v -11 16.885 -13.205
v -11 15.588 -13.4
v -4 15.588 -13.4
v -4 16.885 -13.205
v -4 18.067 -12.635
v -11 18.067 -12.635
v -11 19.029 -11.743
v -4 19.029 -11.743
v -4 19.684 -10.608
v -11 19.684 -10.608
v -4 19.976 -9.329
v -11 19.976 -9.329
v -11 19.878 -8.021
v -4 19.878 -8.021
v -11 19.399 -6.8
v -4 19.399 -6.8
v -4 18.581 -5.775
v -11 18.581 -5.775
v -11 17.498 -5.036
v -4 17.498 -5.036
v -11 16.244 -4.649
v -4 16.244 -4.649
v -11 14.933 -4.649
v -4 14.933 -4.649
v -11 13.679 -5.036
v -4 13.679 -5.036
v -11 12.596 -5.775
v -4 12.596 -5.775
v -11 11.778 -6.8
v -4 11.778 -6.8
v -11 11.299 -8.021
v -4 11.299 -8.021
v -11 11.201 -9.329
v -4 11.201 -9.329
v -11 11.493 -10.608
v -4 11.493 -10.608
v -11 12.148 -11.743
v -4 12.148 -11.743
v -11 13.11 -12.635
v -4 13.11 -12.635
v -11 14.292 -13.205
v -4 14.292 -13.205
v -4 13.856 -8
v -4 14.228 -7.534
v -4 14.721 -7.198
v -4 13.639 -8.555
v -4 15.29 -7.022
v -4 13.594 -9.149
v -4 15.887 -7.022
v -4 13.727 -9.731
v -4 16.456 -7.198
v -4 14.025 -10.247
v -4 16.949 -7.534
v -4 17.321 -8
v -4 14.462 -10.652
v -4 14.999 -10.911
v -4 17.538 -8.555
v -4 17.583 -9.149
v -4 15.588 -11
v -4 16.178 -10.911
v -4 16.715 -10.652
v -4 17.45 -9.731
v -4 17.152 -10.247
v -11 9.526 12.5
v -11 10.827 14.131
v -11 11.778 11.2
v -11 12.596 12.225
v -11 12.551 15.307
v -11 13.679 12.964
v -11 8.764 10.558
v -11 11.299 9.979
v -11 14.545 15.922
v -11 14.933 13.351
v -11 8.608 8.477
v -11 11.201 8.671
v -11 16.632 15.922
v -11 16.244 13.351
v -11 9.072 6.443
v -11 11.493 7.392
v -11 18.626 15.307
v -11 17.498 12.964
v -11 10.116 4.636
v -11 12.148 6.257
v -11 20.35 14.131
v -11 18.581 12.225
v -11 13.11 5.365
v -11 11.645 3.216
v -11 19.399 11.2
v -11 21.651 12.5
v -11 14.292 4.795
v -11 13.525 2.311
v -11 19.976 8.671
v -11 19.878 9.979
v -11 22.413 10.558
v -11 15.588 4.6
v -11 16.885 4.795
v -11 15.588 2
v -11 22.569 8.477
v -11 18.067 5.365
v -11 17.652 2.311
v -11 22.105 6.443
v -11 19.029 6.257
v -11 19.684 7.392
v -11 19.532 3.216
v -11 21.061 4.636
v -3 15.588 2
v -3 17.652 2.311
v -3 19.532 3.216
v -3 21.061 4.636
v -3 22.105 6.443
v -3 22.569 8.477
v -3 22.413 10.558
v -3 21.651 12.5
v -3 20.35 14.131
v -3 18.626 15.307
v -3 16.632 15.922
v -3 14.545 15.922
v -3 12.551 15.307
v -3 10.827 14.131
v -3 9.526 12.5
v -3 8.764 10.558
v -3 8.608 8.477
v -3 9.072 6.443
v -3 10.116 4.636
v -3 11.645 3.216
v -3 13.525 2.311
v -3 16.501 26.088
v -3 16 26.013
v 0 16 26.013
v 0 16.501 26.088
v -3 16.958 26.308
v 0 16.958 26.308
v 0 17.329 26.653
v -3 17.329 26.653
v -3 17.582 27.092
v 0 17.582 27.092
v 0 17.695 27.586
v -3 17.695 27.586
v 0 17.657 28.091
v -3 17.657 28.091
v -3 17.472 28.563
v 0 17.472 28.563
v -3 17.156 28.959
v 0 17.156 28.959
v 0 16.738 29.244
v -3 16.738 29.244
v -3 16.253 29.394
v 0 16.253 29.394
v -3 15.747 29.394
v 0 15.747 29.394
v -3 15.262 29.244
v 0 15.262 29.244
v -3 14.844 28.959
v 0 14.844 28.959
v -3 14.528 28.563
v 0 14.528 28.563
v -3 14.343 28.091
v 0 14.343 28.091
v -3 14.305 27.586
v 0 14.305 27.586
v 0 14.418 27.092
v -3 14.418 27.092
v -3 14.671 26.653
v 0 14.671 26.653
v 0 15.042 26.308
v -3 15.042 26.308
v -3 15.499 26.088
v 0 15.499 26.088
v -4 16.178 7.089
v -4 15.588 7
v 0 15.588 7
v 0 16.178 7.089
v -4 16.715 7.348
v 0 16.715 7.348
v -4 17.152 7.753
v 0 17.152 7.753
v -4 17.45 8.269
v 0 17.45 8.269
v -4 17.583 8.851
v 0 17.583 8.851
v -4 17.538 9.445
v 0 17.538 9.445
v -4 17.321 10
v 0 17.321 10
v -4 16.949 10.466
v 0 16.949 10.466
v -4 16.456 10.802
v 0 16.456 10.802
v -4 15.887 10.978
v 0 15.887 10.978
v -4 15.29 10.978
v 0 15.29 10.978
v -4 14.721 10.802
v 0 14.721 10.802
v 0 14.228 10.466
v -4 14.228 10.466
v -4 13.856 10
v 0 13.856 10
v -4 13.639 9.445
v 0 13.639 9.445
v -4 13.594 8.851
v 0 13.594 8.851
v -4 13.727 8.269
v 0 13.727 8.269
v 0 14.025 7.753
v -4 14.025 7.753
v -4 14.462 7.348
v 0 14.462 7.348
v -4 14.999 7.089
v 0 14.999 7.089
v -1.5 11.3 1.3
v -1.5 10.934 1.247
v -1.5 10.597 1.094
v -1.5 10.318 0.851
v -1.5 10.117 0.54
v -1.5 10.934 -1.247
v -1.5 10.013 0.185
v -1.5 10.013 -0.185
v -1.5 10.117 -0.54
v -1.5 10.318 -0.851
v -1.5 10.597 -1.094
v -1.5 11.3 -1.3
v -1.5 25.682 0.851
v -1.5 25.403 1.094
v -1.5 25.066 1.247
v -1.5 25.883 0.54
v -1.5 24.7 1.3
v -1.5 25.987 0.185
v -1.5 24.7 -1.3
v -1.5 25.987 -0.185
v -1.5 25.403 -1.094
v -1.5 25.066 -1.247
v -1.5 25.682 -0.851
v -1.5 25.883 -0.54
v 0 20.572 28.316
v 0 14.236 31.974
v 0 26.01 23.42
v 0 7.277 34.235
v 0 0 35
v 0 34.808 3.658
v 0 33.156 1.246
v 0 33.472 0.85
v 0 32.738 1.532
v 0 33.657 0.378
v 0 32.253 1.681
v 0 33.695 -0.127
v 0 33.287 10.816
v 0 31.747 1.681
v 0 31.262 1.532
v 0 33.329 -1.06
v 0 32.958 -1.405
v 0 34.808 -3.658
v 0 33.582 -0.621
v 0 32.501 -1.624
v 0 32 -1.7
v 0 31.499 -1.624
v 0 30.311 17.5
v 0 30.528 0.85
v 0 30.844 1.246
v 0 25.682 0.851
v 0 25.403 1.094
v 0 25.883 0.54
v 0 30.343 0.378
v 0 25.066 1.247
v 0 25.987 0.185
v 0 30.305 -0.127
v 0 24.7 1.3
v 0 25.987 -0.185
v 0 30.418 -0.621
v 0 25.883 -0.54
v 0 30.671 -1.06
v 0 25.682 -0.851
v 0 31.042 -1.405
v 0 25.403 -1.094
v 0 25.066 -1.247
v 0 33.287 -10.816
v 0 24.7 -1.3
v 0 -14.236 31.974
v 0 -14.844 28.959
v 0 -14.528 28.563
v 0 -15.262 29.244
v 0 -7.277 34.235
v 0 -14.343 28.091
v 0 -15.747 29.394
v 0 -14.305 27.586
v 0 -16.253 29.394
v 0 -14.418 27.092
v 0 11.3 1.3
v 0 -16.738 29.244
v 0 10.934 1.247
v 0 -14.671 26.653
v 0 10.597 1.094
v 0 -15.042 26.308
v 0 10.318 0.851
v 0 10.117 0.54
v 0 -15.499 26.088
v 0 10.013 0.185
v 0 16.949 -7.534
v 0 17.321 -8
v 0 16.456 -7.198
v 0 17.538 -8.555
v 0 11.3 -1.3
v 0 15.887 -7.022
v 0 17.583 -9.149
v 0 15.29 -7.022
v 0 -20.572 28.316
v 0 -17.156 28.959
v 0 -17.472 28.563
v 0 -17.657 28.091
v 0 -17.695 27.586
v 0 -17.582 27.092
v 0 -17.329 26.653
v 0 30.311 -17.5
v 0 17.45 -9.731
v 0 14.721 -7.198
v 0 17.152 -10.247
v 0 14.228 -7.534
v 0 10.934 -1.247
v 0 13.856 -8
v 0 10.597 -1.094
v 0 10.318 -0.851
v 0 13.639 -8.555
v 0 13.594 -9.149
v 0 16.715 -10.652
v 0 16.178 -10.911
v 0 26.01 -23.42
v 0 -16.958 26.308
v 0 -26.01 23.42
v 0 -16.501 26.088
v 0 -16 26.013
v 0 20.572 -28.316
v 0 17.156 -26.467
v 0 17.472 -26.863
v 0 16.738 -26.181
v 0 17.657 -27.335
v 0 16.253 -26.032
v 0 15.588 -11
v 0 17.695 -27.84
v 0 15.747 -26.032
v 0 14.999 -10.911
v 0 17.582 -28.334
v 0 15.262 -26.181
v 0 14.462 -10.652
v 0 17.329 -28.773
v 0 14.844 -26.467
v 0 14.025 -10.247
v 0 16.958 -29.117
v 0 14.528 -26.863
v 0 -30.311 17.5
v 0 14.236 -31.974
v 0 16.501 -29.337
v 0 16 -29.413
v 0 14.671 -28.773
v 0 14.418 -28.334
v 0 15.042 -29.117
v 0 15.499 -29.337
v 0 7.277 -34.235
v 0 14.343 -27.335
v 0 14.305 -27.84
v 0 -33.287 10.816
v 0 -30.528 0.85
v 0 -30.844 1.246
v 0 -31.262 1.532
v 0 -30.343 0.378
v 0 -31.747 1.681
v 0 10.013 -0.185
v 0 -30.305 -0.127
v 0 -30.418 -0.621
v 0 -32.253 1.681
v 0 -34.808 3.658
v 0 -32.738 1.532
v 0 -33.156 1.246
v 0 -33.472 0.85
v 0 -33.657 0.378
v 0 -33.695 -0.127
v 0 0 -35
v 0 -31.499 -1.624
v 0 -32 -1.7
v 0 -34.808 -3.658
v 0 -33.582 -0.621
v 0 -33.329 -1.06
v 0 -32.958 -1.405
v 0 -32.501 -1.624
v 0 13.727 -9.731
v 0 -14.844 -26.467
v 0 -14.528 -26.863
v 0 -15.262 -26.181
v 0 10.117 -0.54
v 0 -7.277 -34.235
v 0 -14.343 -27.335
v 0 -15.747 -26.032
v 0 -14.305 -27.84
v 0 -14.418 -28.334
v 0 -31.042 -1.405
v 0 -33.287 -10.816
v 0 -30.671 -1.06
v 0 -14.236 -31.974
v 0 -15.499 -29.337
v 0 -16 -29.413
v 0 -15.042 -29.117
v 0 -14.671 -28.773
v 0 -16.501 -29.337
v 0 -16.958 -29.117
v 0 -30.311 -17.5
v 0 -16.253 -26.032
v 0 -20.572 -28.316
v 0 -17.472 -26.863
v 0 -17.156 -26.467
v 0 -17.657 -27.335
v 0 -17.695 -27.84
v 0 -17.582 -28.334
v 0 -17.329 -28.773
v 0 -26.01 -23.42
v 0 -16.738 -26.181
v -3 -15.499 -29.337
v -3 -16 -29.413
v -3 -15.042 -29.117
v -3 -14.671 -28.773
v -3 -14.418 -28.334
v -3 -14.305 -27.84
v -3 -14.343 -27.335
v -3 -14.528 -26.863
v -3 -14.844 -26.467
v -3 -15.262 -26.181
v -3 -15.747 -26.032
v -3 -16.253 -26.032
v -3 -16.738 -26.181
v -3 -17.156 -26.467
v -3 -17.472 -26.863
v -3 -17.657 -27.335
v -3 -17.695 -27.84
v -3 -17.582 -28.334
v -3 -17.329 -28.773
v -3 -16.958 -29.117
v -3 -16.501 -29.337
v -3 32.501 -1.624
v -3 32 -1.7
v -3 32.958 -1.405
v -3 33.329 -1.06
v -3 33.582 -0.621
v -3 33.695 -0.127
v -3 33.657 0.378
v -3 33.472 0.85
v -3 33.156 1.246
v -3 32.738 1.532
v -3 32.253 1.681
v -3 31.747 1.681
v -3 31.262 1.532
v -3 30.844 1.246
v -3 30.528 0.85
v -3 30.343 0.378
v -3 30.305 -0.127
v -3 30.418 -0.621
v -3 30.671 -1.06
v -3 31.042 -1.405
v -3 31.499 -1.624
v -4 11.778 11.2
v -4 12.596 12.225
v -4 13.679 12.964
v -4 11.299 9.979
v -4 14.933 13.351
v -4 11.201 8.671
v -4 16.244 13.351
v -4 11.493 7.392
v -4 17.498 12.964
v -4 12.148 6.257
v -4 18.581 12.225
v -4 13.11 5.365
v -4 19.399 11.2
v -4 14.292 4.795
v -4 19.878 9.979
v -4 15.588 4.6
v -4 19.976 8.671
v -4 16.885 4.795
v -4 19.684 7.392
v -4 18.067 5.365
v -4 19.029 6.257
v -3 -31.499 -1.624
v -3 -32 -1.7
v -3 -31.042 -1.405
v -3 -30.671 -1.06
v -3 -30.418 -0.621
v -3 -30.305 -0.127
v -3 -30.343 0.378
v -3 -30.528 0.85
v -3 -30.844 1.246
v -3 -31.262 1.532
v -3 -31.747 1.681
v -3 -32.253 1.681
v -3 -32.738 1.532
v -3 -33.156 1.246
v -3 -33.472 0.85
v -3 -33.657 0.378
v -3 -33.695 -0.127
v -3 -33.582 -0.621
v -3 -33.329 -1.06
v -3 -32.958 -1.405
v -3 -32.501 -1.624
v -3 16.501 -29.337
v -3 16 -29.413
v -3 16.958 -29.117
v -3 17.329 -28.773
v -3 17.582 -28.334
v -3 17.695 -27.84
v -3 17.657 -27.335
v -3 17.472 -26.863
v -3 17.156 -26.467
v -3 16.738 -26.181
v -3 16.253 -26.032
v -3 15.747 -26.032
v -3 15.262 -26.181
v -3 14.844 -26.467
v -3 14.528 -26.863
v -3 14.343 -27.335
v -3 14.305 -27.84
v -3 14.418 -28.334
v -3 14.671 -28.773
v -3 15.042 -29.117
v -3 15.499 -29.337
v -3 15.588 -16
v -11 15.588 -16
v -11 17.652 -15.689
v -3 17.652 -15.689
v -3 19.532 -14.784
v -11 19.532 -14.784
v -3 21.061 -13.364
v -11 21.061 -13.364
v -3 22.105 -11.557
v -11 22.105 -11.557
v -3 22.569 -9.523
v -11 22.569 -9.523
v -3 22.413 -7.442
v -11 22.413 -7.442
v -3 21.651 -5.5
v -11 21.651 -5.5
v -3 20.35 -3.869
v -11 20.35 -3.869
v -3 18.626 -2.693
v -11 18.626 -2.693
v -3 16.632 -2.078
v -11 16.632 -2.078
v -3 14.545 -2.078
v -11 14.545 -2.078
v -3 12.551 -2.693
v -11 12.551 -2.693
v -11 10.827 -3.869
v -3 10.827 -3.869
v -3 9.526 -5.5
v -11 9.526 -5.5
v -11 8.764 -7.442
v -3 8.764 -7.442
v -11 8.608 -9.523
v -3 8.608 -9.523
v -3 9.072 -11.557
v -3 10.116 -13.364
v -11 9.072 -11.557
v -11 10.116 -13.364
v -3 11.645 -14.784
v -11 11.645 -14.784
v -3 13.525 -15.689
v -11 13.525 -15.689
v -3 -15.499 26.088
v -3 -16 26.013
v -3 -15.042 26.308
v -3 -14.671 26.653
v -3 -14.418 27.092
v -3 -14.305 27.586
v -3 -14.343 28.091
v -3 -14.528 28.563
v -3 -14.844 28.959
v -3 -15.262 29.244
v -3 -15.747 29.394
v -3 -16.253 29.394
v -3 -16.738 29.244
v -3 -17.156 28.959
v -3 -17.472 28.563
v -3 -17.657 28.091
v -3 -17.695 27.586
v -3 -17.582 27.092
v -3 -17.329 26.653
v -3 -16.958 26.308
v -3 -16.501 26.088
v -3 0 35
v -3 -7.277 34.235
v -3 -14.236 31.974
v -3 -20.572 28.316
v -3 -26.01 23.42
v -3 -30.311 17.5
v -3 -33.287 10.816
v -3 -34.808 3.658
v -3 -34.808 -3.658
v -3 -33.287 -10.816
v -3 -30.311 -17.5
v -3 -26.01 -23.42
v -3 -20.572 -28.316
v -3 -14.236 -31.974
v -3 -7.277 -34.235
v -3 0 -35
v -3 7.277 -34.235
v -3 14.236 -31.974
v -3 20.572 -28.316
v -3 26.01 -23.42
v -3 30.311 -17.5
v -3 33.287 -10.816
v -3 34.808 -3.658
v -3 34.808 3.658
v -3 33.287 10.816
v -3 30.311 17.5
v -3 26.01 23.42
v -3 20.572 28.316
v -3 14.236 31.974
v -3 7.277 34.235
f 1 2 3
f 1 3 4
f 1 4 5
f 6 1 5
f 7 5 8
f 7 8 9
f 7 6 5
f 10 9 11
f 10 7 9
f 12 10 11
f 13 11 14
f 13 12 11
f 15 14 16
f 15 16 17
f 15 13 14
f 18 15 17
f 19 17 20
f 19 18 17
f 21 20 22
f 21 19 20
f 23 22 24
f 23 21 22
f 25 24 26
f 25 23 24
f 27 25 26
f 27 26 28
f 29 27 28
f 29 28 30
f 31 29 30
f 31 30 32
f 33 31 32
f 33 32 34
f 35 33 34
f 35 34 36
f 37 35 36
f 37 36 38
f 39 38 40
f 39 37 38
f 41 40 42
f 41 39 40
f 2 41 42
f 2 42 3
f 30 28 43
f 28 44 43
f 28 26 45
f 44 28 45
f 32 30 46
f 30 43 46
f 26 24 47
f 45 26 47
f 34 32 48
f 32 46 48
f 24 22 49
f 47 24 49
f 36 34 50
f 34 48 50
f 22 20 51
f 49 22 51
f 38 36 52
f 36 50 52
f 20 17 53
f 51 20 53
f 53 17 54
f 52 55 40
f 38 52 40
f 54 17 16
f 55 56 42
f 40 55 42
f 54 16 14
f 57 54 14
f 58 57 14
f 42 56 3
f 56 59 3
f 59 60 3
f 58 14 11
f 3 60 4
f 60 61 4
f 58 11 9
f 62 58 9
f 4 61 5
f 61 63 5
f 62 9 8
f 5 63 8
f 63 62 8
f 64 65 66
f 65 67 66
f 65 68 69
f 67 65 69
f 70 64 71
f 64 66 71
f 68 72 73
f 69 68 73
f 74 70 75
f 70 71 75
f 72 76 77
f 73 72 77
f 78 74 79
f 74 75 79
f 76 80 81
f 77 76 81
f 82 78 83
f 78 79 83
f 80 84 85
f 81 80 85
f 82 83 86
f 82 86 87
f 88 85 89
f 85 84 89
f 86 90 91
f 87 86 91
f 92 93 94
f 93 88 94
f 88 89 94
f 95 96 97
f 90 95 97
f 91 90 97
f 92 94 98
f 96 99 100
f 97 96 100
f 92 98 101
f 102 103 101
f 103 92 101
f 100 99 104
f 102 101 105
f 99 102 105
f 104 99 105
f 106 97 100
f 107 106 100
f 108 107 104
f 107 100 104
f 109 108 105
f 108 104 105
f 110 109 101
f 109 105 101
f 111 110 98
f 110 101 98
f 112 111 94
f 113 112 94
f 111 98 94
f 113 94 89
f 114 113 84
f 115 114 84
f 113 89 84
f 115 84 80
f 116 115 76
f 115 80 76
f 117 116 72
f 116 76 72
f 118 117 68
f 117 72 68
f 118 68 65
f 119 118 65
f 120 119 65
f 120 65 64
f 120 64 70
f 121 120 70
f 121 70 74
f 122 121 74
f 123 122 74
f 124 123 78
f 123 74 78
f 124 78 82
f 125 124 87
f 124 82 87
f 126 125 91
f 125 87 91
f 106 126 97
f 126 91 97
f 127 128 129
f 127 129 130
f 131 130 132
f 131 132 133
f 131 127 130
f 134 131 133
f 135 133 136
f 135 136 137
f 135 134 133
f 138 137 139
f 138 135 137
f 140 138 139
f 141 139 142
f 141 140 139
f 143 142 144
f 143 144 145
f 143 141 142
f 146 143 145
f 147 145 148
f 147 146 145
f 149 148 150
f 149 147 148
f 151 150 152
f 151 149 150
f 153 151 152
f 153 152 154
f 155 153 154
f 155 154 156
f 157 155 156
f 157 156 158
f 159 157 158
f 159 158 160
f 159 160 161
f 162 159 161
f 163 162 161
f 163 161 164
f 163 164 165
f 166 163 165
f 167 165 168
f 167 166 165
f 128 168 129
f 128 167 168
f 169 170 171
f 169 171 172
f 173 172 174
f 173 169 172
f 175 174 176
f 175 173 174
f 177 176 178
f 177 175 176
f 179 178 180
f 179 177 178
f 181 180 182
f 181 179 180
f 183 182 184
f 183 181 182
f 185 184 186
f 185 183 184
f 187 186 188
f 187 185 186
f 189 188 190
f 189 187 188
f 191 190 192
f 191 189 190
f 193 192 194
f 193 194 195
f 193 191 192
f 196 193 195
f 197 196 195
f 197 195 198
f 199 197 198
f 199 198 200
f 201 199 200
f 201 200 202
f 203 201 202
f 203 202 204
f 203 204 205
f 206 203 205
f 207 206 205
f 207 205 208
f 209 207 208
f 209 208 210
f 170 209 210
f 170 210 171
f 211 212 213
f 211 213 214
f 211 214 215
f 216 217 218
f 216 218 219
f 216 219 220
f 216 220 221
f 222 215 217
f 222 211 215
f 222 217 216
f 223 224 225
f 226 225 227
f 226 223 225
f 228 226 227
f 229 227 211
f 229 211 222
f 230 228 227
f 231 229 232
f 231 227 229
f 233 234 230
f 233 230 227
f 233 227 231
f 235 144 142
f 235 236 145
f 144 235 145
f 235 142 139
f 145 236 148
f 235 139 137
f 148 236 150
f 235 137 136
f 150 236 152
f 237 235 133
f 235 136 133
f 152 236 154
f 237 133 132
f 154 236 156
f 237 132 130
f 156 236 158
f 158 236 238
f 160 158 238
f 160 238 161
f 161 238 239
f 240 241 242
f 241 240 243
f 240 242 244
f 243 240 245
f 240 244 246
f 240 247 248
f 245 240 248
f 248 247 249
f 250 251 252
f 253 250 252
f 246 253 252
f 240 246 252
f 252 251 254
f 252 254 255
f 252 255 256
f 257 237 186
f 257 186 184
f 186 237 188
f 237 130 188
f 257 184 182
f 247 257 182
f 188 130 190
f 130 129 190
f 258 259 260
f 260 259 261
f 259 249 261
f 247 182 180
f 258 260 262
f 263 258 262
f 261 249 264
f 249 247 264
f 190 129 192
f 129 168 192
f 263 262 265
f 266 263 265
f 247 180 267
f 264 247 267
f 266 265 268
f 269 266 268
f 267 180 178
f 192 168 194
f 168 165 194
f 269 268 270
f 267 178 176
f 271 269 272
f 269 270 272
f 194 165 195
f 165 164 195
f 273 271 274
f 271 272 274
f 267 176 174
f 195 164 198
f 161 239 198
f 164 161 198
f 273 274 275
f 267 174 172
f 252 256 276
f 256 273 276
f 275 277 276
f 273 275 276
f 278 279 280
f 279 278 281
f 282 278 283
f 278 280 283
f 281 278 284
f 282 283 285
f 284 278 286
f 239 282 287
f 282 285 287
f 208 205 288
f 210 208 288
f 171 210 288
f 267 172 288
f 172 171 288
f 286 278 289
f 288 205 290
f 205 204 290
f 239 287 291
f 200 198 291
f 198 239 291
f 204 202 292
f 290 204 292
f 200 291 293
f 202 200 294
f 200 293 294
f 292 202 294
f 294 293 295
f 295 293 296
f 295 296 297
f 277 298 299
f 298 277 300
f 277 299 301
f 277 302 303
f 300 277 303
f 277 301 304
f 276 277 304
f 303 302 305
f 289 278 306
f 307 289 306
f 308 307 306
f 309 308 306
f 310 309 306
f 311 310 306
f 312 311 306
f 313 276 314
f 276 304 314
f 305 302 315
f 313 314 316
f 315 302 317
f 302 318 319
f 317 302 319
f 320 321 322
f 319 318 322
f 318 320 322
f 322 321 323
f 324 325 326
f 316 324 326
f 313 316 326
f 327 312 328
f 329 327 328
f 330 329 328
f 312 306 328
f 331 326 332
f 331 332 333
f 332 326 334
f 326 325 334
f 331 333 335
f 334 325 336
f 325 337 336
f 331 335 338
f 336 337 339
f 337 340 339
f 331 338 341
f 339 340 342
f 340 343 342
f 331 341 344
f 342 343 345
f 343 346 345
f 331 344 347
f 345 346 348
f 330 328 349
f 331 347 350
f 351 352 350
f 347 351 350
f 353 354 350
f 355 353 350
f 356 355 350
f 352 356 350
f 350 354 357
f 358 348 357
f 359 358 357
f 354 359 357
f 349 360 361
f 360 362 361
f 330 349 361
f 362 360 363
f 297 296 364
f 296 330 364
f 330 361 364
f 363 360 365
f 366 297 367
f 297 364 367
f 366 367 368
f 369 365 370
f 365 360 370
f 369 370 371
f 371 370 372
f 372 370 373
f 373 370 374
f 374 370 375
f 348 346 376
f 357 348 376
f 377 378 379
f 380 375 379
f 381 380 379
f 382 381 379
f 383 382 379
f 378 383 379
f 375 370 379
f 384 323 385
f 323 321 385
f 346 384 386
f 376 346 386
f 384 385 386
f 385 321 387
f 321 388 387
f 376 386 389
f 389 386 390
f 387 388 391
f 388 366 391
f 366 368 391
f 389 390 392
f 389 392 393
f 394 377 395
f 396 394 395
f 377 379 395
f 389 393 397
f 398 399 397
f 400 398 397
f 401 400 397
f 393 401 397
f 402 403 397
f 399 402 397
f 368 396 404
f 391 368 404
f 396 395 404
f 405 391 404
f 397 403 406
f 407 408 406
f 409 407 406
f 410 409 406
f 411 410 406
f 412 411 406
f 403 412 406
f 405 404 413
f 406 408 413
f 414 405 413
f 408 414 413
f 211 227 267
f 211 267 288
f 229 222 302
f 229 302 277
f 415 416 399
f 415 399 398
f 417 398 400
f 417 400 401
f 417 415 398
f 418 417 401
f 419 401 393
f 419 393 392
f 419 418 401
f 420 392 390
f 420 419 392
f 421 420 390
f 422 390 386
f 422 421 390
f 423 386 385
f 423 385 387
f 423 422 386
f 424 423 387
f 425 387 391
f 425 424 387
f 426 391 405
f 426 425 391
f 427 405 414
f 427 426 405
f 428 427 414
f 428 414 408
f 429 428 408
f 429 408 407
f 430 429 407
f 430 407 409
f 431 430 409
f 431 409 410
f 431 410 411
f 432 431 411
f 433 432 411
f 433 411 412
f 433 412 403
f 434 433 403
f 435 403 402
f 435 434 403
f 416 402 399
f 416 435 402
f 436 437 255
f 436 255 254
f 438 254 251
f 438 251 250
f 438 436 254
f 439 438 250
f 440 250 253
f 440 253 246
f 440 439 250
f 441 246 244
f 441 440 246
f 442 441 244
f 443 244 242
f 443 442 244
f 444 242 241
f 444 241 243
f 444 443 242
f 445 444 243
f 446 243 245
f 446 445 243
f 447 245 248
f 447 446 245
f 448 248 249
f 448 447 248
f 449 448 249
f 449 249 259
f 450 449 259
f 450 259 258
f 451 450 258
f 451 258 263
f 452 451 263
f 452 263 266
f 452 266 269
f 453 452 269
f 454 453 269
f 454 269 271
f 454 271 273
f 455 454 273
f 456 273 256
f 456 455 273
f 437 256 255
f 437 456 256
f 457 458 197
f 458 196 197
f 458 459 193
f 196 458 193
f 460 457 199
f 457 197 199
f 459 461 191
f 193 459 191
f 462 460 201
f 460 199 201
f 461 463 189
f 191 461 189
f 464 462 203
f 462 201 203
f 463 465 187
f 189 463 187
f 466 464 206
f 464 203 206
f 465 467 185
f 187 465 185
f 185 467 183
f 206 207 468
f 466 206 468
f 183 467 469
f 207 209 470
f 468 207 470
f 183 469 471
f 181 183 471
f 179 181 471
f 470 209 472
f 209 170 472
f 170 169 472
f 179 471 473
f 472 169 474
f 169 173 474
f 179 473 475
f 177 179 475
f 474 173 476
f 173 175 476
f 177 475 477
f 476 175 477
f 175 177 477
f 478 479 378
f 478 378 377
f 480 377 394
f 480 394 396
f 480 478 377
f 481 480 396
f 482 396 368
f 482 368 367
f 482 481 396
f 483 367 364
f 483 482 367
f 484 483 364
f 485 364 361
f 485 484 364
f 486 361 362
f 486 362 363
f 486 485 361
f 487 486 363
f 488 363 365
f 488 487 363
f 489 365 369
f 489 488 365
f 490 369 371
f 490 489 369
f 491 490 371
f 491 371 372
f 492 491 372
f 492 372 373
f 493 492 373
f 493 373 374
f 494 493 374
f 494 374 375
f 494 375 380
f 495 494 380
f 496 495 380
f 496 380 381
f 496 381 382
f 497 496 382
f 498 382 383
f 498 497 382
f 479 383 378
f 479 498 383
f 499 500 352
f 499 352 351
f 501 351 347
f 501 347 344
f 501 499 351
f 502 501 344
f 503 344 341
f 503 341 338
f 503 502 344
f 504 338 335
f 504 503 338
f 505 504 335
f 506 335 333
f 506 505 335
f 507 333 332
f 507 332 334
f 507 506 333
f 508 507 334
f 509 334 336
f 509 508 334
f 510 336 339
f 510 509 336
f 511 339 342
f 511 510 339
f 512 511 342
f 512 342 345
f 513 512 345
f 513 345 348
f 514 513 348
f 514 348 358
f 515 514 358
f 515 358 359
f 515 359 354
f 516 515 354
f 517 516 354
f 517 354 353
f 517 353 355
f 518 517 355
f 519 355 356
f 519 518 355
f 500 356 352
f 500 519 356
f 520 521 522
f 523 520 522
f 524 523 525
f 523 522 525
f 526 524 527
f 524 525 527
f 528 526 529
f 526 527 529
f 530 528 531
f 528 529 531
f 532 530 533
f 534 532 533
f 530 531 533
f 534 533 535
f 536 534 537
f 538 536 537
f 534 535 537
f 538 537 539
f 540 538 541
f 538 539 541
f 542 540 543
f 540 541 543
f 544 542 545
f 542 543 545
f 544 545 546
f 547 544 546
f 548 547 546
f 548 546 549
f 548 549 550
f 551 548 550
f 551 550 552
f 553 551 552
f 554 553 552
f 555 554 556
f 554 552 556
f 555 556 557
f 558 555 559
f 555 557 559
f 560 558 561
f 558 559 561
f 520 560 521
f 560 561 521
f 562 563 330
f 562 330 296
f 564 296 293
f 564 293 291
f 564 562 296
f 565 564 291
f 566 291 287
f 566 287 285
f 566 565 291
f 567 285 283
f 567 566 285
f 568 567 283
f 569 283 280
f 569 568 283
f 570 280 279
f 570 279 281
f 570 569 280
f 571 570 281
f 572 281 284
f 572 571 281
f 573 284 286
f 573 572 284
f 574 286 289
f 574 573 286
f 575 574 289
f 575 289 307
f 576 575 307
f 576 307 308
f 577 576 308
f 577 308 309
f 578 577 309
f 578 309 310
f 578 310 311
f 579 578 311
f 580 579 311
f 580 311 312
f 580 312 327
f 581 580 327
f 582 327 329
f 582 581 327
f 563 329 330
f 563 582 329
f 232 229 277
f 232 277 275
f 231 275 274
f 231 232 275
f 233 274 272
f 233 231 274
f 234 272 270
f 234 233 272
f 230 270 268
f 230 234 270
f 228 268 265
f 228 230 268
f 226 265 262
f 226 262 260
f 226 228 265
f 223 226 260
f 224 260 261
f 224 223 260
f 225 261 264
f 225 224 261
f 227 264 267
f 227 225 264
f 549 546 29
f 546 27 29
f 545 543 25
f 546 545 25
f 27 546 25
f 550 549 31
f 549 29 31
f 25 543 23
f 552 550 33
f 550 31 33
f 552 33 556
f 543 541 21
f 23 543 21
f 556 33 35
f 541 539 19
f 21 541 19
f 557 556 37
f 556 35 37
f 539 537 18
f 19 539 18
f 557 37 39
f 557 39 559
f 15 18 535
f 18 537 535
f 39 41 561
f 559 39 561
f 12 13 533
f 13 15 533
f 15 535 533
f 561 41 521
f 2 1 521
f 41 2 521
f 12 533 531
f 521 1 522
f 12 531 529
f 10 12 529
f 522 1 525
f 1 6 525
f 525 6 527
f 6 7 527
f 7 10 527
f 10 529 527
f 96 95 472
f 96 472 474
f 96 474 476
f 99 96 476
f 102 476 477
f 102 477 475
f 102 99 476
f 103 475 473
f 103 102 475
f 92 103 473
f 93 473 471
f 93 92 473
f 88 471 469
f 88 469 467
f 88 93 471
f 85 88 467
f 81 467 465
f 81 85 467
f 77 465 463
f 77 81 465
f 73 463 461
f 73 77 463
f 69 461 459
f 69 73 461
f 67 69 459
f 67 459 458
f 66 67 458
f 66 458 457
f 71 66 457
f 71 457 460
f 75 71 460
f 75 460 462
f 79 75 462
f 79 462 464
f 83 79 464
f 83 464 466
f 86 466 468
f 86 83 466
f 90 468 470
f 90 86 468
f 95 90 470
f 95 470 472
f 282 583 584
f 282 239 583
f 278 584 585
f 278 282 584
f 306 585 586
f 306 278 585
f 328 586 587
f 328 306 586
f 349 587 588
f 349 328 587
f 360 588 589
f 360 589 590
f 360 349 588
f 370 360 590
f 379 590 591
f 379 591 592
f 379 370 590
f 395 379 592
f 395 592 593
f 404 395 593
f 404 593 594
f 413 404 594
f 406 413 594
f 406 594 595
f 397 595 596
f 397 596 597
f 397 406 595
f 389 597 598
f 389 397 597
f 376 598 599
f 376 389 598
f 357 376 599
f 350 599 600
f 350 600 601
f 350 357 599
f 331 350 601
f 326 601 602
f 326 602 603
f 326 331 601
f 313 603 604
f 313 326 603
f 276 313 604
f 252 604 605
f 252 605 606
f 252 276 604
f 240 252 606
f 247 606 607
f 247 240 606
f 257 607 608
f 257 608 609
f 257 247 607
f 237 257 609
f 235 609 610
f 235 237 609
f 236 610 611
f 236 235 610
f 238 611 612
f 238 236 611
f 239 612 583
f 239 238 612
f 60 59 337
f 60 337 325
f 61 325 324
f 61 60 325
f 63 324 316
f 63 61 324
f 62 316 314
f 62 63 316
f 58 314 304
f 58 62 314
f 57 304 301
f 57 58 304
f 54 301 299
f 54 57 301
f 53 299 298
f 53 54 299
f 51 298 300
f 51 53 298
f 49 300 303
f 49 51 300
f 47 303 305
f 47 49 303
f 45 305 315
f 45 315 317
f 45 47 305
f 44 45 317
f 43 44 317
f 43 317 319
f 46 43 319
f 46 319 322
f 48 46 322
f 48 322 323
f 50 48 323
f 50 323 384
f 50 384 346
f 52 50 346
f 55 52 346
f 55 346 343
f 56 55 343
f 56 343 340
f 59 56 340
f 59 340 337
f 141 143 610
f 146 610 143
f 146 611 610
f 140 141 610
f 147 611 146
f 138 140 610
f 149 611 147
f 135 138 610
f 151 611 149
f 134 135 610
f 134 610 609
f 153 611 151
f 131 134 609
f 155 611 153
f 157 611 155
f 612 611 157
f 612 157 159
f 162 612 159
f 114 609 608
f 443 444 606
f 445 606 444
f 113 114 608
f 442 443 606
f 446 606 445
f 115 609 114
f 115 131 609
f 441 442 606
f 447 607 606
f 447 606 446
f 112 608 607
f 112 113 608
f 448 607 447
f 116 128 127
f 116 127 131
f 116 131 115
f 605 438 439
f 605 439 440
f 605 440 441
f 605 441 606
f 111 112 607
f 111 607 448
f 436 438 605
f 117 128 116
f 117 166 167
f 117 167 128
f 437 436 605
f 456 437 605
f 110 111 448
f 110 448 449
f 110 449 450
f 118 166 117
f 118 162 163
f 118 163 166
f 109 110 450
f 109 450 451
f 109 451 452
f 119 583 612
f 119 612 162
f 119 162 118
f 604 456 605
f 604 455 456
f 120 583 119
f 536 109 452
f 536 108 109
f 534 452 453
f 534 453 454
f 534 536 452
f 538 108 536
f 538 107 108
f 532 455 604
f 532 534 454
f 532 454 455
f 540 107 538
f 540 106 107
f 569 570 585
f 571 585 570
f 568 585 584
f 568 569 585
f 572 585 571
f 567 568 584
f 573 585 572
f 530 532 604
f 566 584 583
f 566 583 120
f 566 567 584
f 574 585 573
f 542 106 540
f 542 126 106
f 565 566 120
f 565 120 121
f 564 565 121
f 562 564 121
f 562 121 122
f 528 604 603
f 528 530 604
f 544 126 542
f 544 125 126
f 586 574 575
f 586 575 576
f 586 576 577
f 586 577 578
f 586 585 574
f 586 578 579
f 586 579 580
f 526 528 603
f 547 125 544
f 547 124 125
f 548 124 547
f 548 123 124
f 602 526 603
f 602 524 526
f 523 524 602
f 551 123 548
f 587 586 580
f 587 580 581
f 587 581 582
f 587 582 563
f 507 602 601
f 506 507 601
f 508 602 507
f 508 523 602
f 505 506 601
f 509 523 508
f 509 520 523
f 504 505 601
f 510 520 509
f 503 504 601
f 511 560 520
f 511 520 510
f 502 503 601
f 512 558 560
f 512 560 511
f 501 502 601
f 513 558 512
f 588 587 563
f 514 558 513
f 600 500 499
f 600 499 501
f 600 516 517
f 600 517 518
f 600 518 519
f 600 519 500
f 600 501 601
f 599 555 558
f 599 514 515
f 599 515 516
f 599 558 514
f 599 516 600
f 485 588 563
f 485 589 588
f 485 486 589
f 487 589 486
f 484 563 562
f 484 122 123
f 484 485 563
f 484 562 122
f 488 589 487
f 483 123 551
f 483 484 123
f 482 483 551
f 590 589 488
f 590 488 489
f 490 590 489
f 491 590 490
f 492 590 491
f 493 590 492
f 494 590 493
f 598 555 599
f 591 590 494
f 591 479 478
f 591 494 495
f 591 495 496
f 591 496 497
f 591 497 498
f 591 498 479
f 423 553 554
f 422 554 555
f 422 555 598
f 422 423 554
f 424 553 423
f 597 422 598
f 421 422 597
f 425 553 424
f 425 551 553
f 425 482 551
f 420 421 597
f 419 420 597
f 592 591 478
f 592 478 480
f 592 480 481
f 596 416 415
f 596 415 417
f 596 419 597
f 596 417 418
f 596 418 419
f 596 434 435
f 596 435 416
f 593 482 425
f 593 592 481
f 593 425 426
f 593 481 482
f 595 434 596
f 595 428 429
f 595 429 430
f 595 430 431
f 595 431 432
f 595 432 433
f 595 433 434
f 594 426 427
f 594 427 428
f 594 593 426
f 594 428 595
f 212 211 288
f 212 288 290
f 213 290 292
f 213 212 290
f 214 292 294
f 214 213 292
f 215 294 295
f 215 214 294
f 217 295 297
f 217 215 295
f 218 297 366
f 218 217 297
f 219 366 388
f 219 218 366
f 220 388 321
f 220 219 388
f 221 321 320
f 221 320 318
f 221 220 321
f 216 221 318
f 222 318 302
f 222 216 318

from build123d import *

# Parameters (mm, degrees)
COVER_DISK_OD70_THICKNESS3_W                   = 3
COVER_DISK_OD70_THICKNESS3_H                   = 35
INTEGRAL_START                                 = -11
TWO_INTEGRAL_OD14_PORT_BOSSES_SKETCH_R         = 7
INTEGRAL_PORT_BOSSES_REAR8MM_DEPTH             = 8
SIX_START                                      = -3
SIX_M3_CLEARANCE_HOLES_DIAMETER3P4_P_2_R       = 1.7
SIX_M3_CLEARANCE_HOLES_DIAMETER3P4_PCD64_DEPTH = 3
TWO_START                                      = -11
TWO_G1_8_TAPPING_PILOT_ENVELOPES_DIA_2_R       = 4.4
TWO_G1_8_TAPPING_PILOT_ENVELOPES_DIAMETE_DEPTH = 7
TWO_WATER_PASSAGES_DIAMETER4_SKETCH_R          = 2
TWO_WATER_PASSAGES_DIAMETER4_DEPTH             = 11
INTERNAL_START                                 = -1.5
INTERNAL_BYPASS_STRIP_GROOVE_LENGTH16_WI_DEPTH = 1.5


with BuildPart() as part:
    # Cover disk OD70 thickness3 → One-piece copper cover blank (revolve)
    with BuildSketch(Plane.XY, mode=Mode.PRIVATE) as one_piece_copper_cover_blank_sk:
        with Locations((-1.5, 17.5)):
            Rectangle(COVER_DISK_OD70_THICKNESS3_W, COVER_DISK_OD70_THICKNESS3_H)
    revolve(one_piece_copper_cover_blank_sk.sketch.rotate(Axis((-30, 0, 0), (1, 0, 0)), 90), axis=Axis((-30, 0, 0), (1, 0, 0)))

    # Two integral OD14 port bosses sketch → Integral port bosses rear8mm (add)
    with BuildSketch(Plane(origin=(0, 0, 0), x_dir=(0, 0, -1), z_dir=(1, 0, 0)).offset(INTEGRAL_START)):
        with Locations((-9, 15.588457268)):
            Circle(TWO_INTEGRAL_OD14_PORT_BOSSES_SKETCH_R)
        with Locations((9, 15.588457268)):
            Circle(TWO_INTEGRAL_OD14_PORT_BOSSES_SKETCH_R)
    extrude(amount=INTEGRAL_PORT_BOSSES_REAR8MM_DEPTH)

    # Six M3 clearance holes diameter3p4 P 2 → Six M3 clearance holes diameter3p4 PCD64 (cut)
    with BuildSketch(Plane(origin=(0, 0, 0), x_dir=(0, 0, -1), z_dir=(1, 0, 0)).offset(SIX_START)):
        with Locations((0, 32)):
            Circle(SIX_M3_CLEARANCE_HOLES_DIAMETER3P4_P_2_R)
        with Locations((-27.712812921, 16)):
            Circle(SIX_M3_CLEARANCE_HOLES_DIAMETER3P4_P_2_R)
        with Locations((-27.712812921, -16)):
            Circle(SIX_M3_CLEARANCE_HOLES_DIAMETER3P4_P_2_R)
        with Locations((0, -32)):
            Circle(SIX_M3_CLEARANCE_HOLES_DIAMETER3P4_P_2_R)
        with Locations((27.712812921, -16)):
            Circle(SIX_M3_CLEARANCE_HOLES_DIAMETER3P4_P_2_R)
        with Locations((27.712812921, 16)):
            Circle(SIX_M3_CLEARANCE_HOLES_DIAMETER3P4_P_2_R)
    extrude(amount=SIX_M3_CLEARANCE_HOLES_DIAMETER3P4_PCD64_DEPTH, mode=Mode.SUBTRACT)

    # Two G1-8 tapping pilot envelopes dia 2 → Two G1-8 tapping pilot envelopes diamete (cut)
    with BuildSketch(Plane(origin=(0, 0, 0), x_dir=(0, 0, -1), z_dir=(1, 0, 0)).offset(TWO_START)):
        with Locations((-9, 15.588457268)):
            Circle(TWO_G1_8_TAPPING_PILOT_ENVELOPES_DIA_2_R)
        with Locations((9, 15.588457268)):
            Circle(TWO_G1_8_TAPPING_PILOT_ENVELOPES_DIA_2_R)
    extrude(amount=TWO_G1_8_TAPPING_PILOT_ENVELOPES_DIAMETE_DEPTH, mode=Mode.SUBTRACT)

    # Two water passages diameter4 sketch → Two water passages diameter4 (cut)
    with BuildSketch(Plane(origin=(0, 0, 0), x_dir=(0, 0, -1), z_dir=(1, 0, 0)).offset(TWO_START)):
        with Locations((-9, 15.588457268)):
            Circle(TWO_WATER_PASSAGES_DIAMETER4_SKETCH_R)
        with Locations((9, 15.588457268)):
            Circle(TWO_WATER_PASSAGES_DIAMETER4_SKETCH_R)
    extrude(amount=TWO_WATER_PASSAGES_DIAMETER4_DEPTH, mode=Mode.SUBTRACT)

    # Internal bypass-strip groove length1 2 → Internal bypass-strip groove length16 wi (cut)
    with BuildSketch(Plane(origin=(0, 0, 0), x_dir=(0, 0, -1), z_dir=(1, 0, 0)).offset(INTERNAL_START)):
        with BuildLine():
            Line((1.3, 11.3), (1.3, 24.7))
            ThreePointArc((1.3, 24.7), (0, 26), (-1.3, 24.7))
            Line((-1.3, 24.7), (-1.3, 11.3))
            ThreePointArc((-1.3, 11.3), (0, 10), (1.3, 11.3))
        make_face()
    extrude(amount=INTERNAL_BYPASS_STRIP_GROOVE_LENGTH16_WI_DEPTH, mode=Mode.SUBTRACT)


solid = part.part
